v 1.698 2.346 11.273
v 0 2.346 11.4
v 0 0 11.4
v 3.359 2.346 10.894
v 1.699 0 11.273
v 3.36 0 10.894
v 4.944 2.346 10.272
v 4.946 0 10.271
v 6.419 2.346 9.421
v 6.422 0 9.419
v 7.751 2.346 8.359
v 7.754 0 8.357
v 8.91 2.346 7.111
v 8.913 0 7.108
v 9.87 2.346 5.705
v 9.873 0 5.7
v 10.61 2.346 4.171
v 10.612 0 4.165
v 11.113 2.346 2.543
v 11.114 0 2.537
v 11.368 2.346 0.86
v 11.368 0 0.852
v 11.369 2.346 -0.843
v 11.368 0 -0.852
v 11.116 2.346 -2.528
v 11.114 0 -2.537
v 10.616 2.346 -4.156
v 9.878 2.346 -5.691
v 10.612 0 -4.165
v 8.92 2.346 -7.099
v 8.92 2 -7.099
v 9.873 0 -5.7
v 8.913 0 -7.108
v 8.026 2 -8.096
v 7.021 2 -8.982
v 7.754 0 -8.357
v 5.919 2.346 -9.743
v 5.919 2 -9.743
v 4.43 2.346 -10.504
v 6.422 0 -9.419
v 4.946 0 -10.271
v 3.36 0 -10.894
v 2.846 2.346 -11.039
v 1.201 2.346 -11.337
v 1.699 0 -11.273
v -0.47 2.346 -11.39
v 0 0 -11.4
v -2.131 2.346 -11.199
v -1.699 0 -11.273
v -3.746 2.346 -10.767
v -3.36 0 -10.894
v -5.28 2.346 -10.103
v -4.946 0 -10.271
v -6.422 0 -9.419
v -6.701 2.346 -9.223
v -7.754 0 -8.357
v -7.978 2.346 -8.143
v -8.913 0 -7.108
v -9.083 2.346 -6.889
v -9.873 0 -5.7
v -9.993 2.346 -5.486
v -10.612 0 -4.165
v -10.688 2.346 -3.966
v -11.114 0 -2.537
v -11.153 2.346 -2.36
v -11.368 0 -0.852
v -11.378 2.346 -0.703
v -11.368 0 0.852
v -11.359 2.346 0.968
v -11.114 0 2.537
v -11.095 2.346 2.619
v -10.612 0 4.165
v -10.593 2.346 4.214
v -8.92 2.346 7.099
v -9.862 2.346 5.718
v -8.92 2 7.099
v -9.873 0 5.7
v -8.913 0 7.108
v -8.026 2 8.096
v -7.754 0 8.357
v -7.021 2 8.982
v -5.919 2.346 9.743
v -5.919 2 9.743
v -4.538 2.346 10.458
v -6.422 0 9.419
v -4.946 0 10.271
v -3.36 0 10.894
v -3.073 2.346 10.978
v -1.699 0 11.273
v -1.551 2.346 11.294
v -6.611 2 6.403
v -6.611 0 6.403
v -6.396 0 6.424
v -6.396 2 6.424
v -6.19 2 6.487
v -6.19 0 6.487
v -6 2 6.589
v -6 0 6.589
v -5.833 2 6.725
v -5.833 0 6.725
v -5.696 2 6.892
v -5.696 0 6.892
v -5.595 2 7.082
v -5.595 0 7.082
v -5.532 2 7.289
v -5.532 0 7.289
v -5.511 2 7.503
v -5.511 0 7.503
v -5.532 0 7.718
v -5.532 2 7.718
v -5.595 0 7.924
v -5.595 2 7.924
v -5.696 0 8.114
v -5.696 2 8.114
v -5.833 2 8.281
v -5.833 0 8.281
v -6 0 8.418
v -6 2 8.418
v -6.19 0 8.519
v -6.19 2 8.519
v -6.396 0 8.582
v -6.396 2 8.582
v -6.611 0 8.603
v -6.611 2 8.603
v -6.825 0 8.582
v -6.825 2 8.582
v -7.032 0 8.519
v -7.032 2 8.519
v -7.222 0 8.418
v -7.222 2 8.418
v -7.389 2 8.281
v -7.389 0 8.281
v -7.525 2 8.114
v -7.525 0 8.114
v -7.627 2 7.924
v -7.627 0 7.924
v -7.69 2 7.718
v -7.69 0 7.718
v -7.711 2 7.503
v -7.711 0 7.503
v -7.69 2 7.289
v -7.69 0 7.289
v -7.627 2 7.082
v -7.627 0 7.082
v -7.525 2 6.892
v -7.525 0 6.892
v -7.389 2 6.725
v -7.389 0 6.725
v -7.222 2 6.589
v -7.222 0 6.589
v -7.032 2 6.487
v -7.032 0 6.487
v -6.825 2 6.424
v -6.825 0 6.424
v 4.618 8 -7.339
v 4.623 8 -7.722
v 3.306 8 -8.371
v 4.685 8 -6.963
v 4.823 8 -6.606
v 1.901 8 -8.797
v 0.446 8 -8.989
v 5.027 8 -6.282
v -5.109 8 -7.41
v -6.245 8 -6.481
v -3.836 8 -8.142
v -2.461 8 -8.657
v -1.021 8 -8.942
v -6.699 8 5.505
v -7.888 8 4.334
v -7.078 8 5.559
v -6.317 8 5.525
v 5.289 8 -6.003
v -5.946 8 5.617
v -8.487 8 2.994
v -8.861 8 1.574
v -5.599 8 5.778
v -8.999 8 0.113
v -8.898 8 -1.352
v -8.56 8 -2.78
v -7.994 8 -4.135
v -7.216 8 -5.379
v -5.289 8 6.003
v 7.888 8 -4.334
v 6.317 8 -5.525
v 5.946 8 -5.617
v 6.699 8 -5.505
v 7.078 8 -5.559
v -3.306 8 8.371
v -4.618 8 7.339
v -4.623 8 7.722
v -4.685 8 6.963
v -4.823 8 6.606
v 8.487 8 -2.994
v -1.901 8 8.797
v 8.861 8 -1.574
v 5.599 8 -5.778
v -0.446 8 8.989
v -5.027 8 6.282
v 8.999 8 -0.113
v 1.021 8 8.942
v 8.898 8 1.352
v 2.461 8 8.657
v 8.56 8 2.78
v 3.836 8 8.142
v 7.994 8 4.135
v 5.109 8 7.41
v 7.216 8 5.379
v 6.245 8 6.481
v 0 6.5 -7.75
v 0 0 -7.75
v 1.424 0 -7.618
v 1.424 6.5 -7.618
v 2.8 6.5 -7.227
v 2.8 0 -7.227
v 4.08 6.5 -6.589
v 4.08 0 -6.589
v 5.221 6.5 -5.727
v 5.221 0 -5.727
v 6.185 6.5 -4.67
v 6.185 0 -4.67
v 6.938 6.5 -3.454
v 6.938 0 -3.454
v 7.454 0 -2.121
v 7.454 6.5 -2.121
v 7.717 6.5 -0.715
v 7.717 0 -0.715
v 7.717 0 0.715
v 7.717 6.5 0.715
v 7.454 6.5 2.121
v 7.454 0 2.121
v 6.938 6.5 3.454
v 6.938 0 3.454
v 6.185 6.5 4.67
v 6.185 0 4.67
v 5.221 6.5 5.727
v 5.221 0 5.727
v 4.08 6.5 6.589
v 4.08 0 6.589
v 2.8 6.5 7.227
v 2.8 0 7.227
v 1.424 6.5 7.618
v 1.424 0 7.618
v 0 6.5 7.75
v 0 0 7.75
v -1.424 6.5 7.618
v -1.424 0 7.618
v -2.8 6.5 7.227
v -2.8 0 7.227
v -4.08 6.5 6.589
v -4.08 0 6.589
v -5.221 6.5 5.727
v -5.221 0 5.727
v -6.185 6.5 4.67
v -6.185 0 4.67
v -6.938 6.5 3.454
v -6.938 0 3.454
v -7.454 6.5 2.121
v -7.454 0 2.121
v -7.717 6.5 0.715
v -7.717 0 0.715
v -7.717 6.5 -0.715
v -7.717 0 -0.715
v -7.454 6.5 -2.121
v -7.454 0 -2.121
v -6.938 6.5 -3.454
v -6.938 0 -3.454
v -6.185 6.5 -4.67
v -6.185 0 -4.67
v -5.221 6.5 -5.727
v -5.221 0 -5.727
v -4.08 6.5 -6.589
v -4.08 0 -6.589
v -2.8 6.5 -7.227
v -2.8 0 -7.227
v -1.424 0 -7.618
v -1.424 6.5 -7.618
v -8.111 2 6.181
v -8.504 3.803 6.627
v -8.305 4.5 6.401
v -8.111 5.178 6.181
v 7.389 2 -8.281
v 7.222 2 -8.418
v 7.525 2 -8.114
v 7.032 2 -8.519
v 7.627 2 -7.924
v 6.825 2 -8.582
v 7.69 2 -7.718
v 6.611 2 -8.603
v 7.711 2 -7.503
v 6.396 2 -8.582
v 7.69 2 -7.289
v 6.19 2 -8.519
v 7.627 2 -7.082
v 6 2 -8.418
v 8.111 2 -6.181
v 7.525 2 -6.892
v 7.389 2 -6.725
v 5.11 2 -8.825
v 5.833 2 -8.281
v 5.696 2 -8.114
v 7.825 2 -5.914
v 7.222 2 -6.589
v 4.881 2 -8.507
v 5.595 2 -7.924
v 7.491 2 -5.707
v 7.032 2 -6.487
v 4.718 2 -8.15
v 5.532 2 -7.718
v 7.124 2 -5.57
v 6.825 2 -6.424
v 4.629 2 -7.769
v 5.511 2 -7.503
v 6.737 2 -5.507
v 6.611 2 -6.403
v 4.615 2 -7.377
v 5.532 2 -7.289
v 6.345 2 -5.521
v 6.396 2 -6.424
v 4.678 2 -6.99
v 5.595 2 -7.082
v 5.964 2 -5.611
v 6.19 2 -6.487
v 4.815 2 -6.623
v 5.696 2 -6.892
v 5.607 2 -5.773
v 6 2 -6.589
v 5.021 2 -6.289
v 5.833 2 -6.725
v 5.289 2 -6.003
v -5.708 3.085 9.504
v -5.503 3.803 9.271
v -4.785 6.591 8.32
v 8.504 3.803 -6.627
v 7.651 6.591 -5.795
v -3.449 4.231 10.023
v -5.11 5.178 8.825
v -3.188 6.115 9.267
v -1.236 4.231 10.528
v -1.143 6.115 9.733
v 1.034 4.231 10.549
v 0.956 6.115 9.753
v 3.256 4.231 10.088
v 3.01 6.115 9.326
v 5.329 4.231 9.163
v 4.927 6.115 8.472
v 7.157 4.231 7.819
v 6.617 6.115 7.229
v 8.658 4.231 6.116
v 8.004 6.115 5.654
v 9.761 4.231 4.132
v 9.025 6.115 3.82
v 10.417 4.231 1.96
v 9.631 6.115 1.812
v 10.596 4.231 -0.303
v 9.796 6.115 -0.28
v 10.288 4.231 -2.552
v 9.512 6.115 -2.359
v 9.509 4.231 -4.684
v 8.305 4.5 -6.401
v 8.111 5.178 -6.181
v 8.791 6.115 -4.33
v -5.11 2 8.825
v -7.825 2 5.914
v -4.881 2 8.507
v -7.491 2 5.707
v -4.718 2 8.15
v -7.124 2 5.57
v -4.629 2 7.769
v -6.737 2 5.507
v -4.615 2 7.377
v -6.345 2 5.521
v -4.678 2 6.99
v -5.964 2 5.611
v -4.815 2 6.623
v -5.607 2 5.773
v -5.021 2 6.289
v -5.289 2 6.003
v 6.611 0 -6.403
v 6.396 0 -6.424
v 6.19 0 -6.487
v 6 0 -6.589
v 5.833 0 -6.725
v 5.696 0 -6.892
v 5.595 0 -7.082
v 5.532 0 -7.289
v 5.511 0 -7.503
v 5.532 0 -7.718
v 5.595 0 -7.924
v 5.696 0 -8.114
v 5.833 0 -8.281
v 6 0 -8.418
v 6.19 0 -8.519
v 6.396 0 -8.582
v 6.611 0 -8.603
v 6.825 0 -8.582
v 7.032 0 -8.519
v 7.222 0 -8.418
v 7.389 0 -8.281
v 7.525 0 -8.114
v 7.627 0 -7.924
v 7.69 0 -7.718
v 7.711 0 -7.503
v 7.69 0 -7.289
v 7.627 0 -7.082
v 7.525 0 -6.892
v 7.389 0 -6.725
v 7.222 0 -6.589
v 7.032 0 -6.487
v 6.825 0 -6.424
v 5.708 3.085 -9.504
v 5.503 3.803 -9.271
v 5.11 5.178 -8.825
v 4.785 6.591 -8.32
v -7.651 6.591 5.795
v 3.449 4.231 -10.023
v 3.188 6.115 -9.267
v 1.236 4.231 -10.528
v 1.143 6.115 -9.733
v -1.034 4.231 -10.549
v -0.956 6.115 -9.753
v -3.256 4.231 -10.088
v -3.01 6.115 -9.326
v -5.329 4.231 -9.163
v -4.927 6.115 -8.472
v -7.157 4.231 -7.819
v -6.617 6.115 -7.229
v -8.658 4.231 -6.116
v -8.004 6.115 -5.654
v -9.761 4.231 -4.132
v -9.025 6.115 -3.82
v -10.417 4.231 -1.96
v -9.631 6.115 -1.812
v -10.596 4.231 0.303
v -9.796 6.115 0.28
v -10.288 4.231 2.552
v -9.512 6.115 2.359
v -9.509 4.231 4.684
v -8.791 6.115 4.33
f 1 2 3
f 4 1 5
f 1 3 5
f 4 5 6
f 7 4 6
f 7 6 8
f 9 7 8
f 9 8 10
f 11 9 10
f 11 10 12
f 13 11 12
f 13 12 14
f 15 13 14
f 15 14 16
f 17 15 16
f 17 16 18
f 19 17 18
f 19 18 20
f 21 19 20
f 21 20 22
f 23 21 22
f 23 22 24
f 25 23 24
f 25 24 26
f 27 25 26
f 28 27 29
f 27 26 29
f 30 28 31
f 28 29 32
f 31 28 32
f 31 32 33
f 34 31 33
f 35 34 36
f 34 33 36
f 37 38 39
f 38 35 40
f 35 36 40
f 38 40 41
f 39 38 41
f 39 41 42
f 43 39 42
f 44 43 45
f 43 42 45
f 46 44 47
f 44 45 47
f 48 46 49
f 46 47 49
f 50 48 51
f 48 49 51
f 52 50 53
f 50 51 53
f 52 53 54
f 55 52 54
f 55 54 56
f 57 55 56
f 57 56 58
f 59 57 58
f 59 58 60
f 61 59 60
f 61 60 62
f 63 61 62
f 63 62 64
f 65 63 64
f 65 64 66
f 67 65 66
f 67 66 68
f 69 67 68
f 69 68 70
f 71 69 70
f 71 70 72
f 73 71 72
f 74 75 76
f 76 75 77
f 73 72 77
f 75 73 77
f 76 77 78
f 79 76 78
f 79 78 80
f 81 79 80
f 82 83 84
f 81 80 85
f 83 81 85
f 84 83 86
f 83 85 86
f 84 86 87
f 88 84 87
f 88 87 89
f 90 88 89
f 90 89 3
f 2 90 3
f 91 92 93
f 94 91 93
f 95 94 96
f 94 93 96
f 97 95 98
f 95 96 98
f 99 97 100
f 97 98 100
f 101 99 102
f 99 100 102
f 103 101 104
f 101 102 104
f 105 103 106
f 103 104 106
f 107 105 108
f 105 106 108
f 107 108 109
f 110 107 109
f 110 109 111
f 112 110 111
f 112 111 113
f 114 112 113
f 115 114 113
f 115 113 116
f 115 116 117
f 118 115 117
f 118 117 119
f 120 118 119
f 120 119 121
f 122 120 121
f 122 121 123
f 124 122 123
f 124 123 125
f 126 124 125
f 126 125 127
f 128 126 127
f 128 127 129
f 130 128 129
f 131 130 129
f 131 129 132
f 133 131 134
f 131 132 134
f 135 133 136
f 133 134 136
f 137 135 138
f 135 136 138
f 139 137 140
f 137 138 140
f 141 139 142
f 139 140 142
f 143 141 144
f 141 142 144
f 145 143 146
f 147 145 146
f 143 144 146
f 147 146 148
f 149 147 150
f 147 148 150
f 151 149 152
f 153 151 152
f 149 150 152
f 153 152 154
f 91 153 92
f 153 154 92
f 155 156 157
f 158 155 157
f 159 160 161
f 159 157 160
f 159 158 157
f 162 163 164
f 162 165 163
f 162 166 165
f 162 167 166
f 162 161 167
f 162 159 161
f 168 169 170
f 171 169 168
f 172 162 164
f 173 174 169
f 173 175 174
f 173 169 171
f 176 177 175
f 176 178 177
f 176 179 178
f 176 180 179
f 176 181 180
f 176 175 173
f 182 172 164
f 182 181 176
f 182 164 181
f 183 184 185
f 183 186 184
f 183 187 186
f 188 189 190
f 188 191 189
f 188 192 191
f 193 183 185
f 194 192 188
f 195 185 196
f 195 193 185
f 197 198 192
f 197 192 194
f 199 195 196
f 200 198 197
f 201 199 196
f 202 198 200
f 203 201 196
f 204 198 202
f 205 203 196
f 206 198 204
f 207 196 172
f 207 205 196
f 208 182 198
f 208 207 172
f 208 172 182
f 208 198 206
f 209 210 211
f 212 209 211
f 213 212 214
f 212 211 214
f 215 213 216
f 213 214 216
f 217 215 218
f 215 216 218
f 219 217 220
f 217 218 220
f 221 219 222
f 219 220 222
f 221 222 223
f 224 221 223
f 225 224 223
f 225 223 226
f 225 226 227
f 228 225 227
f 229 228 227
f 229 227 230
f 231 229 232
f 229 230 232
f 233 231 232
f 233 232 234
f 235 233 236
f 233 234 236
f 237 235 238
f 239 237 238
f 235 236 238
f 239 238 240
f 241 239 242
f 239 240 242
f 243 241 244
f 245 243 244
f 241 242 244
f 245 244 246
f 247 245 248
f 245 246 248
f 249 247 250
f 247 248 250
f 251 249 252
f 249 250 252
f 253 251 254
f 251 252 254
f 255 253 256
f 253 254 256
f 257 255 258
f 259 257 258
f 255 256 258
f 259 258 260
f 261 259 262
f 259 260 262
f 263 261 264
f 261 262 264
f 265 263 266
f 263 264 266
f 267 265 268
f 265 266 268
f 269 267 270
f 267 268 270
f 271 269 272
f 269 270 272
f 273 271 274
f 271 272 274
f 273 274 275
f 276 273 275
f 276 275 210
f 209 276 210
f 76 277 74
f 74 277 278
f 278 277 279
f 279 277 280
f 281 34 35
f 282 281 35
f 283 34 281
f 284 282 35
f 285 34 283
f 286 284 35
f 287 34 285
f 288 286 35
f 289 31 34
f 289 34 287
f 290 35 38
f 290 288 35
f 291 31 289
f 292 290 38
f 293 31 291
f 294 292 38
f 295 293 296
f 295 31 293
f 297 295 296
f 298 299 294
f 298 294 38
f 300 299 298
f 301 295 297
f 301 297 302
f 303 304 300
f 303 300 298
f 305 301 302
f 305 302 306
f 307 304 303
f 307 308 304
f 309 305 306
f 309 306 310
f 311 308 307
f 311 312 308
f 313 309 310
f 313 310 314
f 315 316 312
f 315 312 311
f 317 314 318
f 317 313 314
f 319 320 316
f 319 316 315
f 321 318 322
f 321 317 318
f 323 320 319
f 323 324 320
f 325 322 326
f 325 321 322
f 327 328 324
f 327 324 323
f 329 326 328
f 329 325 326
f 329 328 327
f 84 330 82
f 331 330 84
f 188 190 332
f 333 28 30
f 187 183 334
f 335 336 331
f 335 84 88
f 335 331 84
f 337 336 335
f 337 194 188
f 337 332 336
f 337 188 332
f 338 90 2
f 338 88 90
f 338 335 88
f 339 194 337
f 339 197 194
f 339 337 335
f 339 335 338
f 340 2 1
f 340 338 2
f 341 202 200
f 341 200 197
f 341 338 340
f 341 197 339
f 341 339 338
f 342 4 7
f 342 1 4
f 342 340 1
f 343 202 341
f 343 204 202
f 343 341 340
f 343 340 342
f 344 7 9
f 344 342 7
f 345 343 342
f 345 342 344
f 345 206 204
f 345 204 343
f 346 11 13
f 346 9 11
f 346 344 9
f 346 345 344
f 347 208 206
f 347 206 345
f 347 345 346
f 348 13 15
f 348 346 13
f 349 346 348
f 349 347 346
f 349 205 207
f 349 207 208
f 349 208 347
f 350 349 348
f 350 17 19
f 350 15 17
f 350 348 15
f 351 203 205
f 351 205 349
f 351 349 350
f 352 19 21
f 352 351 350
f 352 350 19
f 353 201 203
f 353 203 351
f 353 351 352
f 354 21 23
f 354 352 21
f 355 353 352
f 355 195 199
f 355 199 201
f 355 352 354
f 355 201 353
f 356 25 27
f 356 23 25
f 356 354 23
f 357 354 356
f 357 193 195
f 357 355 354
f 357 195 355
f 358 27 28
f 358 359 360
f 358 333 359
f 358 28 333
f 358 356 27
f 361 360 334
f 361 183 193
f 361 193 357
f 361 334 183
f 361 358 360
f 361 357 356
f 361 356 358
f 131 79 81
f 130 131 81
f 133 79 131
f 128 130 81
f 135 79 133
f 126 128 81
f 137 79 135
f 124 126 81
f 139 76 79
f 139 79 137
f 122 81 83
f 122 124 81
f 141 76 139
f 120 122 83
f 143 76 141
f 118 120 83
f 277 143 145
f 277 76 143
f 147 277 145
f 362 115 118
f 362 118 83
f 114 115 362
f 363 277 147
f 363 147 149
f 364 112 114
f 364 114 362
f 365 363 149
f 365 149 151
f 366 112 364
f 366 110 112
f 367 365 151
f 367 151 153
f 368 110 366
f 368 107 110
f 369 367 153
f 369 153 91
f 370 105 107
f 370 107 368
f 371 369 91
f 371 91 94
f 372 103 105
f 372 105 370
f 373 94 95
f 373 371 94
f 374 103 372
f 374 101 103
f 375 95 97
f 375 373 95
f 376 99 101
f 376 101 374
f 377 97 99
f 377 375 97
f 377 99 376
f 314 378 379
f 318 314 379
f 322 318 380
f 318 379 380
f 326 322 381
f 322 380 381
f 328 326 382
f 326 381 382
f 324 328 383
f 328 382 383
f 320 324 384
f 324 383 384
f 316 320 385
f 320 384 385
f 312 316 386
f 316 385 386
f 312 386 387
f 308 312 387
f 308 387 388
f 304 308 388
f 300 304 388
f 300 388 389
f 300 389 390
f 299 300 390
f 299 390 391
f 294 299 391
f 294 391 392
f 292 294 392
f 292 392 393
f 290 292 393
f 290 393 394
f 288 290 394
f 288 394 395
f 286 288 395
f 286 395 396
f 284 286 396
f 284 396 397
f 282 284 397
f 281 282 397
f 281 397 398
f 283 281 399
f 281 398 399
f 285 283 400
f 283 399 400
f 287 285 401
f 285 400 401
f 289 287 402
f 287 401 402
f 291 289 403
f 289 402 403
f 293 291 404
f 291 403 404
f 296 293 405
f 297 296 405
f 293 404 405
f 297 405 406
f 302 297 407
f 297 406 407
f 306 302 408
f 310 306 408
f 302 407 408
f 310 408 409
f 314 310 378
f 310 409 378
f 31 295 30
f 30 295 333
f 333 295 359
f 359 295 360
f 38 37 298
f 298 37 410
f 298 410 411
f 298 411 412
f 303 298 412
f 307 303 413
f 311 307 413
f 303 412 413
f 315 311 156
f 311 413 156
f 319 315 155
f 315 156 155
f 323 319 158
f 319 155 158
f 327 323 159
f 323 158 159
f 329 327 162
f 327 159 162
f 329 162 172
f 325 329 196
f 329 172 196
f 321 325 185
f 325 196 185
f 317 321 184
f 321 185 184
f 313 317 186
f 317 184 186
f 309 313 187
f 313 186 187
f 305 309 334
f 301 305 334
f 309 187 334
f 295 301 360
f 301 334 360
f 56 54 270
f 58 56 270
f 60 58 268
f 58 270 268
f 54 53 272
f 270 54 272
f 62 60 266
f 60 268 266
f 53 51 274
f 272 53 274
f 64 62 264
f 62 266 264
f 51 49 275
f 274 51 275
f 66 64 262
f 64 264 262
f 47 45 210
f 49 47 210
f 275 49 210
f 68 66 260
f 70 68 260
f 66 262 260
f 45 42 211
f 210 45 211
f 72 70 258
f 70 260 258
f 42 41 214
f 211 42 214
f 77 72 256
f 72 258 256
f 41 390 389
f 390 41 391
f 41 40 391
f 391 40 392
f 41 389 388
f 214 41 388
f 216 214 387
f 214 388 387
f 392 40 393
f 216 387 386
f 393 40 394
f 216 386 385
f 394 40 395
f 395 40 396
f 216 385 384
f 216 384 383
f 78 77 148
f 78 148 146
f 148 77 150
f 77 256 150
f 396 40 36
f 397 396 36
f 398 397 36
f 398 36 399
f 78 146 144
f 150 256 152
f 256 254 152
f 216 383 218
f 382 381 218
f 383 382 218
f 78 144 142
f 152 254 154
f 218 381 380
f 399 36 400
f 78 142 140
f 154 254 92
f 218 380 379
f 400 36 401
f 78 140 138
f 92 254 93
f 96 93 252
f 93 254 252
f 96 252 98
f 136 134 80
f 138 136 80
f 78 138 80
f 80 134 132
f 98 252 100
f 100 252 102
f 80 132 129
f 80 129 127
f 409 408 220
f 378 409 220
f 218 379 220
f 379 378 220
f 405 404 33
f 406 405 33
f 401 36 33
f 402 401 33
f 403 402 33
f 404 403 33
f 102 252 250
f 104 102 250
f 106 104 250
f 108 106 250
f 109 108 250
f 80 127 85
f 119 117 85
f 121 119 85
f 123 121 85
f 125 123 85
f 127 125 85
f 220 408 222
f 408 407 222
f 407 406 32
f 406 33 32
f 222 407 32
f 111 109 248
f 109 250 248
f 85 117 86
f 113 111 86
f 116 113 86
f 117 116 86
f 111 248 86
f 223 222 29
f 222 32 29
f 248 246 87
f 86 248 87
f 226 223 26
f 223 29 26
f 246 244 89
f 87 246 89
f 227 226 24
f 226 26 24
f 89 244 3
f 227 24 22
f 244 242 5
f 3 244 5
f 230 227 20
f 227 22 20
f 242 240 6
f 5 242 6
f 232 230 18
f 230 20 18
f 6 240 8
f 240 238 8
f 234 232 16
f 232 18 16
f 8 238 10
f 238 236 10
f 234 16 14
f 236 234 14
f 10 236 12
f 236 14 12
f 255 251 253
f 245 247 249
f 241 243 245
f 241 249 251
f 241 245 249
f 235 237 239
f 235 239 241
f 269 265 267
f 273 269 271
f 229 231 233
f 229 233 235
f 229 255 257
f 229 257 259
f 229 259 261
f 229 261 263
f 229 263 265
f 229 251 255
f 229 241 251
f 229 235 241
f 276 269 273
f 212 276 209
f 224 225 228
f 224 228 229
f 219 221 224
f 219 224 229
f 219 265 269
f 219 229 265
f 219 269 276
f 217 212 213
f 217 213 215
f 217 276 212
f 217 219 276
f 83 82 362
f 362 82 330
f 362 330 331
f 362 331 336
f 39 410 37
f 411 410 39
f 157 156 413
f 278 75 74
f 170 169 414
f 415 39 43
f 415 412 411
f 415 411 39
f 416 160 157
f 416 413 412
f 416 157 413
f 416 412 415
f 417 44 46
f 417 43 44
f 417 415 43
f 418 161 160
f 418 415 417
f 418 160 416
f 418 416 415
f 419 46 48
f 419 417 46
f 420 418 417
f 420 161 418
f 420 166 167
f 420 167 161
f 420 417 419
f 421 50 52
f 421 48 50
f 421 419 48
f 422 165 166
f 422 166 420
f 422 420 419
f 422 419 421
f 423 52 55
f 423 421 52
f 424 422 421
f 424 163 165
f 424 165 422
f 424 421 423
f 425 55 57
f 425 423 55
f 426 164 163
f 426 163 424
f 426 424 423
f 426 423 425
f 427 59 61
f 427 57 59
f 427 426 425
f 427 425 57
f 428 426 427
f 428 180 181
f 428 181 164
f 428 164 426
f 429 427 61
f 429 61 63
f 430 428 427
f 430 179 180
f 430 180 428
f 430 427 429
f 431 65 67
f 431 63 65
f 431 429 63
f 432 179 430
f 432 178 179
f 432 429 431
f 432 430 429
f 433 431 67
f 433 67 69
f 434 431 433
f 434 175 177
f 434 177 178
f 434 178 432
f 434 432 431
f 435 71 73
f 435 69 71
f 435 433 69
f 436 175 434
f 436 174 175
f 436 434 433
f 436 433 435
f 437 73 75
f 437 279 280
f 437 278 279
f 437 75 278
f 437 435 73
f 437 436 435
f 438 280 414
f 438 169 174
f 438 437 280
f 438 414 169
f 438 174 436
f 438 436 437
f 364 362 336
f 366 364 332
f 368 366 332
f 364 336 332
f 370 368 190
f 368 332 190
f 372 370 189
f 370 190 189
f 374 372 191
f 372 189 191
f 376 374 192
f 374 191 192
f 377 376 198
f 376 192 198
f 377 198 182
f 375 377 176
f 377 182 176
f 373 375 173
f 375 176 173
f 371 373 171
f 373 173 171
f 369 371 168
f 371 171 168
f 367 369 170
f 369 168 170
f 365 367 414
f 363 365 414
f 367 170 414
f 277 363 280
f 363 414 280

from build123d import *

# Parameters (mm, degrees)
SKETCH1_R           = 11.4
BOSS_EXTRUDE1_DEPTH = 8
SKETCH2_OUTSIDE_W   = 38.236
SKETCH2_OUTSIDE_H   = 38.236
SKETCH2_OUTSIDE_R   = 9
CUT_EXTRUDE1_DEPTH  = 8
CUT_EXTRUDE1_DRAFT  = -23
SKETCH3_R           = 1.1
CUT_EXTRUDE2_DEPTH  = 8
CUT_EXTRUDE3_DEPTH  = 6
CIRPATTERN1_COUNT   = 2
SKETCH5_R           = 7.75
CUT_EXTRUDE5_DEPTH  = 6.5


with BuildPart() as part:
    # Sketch1 → Boss-Extrude1 (new body)
    with BuildSketch(Plane(origin=(0, 0, 0), x_dir=(1, 0, 0), z_dir=(0, 1, 0))):
        with Locations(Location((0, 0, 0), (0, 0, 270))):
            Circle(SKETCH1_R)
    extrude(amount=BOSS_EXTRUDE1_DEPTH)


with BuildPart() as cut_extrude1_tool:
    # Sketch2 outside → Cut-Extrude1 (with draft: the straight prism first)
    with BuildSketch(Plane(origin=(0, 8, 0), x_dir=(1, 0, 0), z_dir=(0, 1, 0))):
        Rectangle(SKETCH2_OUTSIDE_W, SKETCH2_OUTSIDE_H)
        Circle(SKETCH2_OUTSIDE_R, mode=Mode.SUBTRACT)
    extrude(amount=-CUT_EXTRUDE1_DEPTH)
    # Cut-Extrude1: the draft: its side faces are tilted about the plane it starts from
    cut_extrude1_sides = [cut_extrude1_tool.faces().sort_by_distance(p)[0] for p in [
        (0, 4, 19.118),
        (19.118, 4, 0),
        (0, 4, -19.118),
        (-19.118, 4, 0),
        (-9, 4, 0),
    ]]
    draft(cut_extrude1_sides, Plane(origin=(0, 8, 0), x_dir=(1, 0, 0), z_dir=(0, 1, 0)), CUT_EXTRUDE1_DRAFT)


with BuildPart() as part_1:
    add(part.part)

    # Cut-Extrude1: cut by cut_extrude1_tool
    add(cut_extrude1_tool.part, mode=Mode.SUBTRACT)

    # Sketch3 → Cut-Extrude2 (cut)
    with BuildSketch(Plane.XZ):
        with Locations(Location((-6.610810867, 7.503144653, 0), (0, 0, 270))):
            Circle(SKETCH3_R)
    cut_extrude2 = extrude(amount=-CUT_EXTRUDE2_DEPTH, mode=Mode.SUBTRACT)

    # Sketch4 → Cut-Extrude3 (cut)
    with BuildSketch(Plane(origin=(0, 8, 0), x_dir=(1, 0, 0), z_dir=(0, 1, 0))):
        with BuildLine():
            Line((-8.111439797, -6.18098248), (-10.53240187, -8.928728406))
            Line((-10.53240187, -8.928728406), (-7.531144009, -11.573052753))
            Line((-7.531144009, -11.573052753), (-5.110181936, -8.825306826))
            ThreePointArc((-5.110181936, -8.825306826), (-5.288648693, -6.002515722), (-8.111439797, -6.18098248))
        make_face()
    cut_extrude3 = extrude(amount=-CUT_EXTRUDE3_DEPTH, mode=Mode.SUBTRACT)

    # CirPattern1: Cut-Extrude2, Cut-Extrude3 ×2 about axis
    cirpattern1_axis = Axis((0, 0, 0), (0, 1, 0))
    add([cut_extrude2.rotate(cirpattern1_axis, i * 360 / CIRPATTERN1_COUNT) for i in range(1, CIRPATTERN1_COUNT)], mode=Mode.SUBTRACT)
    add([cut_extrude3.rotate(cirpattern1_axis, i * 360 / CIRPATTERN1_COUNT) for i in range(1, CIRPATTERN1_COUNT)], mode=Mode.SUBTRACT)

    # Sketch5 → Cut-Extrude5 (cut)
    with BuildSketch(Plane.XZ):
        with Locations(Location((0, 0, 0), (0, 0, 270))):
            Circle(SKETCH5_R)
    extrude(amount=-CUT_EXTRUDE5_DEPTH, mode=Mode.SUBTRACT)


solid = part_1.part
